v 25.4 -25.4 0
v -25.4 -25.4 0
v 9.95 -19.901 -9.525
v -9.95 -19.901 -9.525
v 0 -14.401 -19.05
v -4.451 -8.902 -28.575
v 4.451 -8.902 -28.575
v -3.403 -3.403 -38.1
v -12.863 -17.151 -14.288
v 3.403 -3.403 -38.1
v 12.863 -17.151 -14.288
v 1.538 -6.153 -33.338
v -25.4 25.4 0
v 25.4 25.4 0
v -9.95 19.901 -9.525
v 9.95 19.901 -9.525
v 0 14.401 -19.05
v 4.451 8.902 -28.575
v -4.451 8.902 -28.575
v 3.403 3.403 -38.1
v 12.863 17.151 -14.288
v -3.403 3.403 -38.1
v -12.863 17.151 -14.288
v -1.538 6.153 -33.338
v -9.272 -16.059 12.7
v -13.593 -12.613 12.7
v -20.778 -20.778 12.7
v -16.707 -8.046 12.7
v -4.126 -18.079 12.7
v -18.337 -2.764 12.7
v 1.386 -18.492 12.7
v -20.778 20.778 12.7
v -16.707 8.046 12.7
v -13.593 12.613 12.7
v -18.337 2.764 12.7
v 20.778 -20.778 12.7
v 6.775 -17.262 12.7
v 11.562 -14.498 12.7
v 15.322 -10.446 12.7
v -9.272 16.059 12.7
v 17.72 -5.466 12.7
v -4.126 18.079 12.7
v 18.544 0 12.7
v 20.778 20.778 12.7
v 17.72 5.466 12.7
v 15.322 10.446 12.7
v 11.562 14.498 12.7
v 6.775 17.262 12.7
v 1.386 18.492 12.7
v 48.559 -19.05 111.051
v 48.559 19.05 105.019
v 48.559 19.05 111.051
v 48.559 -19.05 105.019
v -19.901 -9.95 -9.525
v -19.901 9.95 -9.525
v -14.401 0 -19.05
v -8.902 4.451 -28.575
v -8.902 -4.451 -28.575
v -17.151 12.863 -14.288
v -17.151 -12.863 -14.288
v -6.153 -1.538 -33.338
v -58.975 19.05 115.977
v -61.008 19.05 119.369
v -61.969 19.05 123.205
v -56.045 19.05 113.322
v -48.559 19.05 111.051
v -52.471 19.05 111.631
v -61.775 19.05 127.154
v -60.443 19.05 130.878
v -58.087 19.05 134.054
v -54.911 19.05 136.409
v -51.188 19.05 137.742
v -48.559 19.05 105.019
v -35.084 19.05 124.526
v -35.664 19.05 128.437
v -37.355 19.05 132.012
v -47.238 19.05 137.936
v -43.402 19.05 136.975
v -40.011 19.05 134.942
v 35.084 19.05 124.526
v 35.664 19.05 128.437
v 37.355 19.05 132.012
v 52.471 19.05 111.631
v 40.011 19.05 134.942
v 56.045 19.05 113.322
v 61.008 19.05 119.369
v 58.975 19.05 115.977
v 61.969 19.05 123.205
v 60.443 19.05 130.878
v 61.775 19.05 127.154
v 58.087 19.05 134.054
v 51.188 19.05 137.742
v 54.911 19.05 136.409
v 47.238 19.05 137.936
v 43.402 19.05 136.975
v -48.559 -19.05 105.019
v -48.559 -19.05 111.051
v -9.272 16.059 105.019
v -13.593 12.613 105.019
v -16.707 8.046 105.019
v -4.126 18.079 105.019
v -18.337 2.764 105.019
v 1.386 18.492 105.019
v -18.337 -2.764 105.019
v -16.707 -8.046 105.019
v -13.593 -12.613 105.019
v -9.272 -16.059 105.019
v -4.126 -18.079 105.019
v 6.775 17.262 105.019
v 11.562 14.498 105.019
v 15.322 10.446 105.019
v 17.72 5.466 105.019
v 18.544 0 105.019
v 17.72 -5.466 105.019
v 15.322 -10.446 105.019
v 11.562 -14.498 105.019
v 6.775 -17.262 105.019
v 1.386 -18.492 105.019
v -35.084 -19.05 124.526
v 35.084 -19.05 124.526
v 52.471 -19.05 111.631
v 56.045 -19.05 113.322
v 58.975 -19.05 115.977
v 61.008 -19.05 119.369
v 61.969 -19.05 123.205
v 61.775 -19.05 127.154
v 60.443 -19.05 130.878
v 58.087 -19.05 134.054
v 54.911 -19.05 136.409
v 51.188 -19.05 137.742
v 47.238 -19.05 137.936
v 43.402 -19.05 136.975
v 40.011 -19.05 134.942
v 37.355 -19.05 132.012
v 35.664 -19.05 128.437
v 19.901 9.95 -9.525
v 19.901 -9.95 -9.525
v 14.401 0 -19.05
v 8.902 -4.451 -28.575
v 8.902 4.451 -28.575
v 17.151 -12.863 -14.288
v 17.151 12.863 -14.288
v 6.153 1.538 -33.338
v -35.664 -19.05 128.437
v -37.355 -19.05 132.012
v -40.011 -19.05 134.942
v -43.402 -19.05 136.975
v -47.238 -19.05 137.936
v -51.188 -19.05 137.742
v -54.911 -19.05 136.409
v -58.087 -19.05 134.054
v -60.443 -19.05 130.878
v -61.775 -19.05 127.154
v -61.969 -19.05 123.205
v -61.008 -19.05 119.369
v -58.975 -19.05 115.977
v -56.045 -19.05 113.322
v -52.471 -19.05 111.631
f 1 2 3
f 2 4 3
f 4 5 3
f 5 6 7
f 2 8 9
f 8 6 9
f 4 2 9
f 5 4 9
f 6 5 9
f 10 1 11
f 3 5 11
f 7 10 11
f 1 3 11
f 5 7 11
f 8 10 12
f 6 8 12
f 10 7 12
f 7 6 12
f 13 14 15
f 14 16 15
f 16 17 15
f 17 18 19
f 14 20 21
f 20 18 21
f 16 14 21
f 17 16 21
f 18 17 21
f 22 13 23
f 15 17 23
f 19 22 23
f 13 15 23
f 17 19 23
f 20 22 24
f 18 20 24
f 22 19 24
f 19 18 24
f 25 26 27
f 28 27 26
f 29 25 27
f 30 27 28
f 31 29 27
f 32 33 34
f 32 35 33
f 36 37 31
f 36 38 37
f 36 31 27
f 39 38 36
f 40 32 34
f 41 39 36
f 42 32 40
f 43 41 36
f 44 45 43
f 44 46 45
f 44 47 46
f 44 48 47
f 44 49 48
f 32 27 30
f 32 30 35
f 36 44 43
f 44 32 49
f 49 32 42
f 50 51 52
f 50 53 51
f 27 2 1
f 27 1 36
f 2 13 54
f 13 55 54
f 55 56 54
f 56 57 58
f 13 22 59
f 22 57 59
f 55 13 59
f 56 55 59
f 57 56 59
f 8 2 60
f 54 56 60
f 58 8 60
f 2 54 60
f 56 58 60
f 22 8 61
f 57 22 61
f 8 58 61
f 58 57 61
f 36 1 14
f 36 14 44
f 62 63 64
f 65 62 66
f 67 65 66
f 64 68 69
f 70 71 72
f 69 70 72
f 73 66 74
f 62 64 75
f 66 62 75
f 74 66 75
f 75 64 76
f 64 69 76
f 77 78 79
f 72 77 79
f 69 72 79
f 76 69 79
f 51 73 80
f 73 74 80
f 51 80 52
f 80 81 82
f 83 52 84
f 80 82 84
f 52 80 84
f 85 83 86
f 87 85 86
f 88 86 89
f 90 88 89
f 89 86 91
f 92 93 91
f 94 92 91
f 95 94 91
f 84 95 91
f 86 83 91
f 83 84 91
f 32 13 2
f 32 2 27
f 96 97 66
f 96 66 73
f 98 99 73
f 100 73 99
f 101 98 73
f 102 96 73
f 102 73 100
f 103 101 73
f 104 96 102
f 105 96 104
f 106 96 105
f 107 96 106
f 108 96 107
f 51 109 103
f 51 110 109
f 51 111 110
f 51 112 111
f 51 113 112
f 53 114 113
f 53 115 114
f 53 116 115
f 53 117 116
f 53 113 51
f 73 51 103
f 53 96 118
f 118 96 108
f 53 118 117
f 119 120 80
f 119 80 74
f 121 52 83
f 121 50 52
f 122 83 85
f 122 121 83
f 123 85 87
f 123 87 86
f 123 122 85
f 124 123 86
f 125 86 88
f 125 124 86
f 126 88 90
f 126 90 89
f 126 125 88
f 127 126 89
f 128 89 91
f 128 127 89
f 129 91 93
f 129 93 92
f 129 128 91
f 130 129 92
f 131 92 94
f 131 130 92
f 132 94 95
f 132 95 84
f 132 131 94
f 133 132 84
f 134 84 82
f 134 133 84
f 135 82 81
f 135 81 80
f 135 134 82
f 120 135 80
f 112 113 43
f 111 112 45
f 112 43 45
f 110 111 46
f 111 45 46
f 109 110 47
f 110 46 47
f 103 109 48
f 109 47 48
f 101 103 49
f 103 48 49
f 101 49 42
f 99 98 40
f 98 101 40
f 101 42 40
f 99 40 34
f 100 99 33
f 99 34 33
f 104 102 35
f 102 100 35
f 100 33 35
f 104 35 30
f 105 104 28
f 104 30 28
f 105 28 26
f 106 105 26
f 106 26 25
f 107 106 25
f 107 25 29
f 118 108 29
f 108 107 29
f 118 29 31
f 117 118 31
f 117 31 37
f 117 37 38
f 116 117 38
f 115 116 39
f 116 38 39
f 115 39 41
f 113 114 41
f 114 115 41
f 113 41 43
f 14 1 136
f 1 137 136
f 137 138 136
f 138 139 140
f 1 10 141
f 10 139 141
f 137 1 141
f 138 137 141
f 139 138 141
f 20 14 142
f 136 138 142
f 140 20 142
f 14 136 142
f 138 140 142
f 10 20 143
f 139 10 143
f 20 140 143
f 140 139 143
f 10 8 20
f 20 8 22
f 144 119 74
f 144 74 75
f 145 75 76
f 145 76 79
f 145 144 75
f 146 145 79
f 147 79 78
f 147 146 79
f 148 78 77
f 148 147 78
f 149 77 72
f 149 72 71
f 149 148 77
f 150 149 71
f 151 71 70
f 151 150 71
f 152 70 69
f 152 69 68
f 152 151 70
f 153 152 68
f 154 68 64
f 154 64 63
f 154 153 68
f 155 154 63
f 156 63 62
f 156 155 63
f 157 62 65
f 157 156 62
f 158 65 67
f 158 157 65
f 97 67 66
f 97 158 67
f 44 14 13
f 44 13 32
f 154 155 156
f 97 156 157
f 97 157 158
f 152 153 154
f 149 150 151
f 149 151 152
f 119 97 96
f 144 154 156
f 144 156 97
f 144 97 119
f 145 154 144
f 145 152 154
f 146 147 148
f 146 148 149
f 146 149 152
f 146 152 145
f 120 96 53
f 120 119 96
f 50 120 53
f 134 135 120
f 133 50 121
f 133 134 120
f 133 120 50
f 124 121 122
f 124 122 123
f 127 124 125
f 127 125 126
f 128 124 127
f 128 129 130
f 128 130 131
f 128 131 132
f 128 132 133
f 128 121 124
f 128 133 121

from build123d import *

# Parameters (mm, degrees)
F0_W      = 50.8
F0_H      = 50.8
F1_DEPTH  = 38.1
F1_TAPER  = 30
F1_FACE_W = 50.8
F1_FACE_H = 50.8
F2_DEPTH  = 12.7
F2_TAPER  = 20
F3_R      = 18.5436929907
F4_DEPTH  = 101.6
F6_DEPTH  = 19.05


with BuildPart() as f1:
    # F0 (on Top) → F1 (new body)
    with BuildSketch(Plane.XY):
        Rectangle(F0_W, F0_H)
    extrude(amount=-F1_DEPTH, taper=F1_TAPER)

    # F1_face (on face) → F2 (join)
    with BuildSketch(Plane.XY):
        Rectangle(F1_FACE_W, F1_FACE_H)
    extrude(amount=F2_DEPTH, taper=F2_TAPER)

    # F3 (on face) → F4 (join)
    with BuildSketch(Plane.XY.offset(12.7)):
        Circle(F3_R)
    extrude(amount=F4_DEPTH)

    # F5 (on Front) → F6 (join, symmetric)
    with BuildSketch(Plane.XZ):
        with BuildLine():
            ThreePointArc((48.5590323806, 111.0507363485), (58.0872045338, 134.0537787855), (35.0841620969, 124.5256066322))
            Line((35.0841620969, 124.5256066322), (-35.0841620969, 124.5256066322))
            ThreePointArc((-35.0841620969, 124.5256066322), (-58.0872045338, 134.0537787855), (-48.5590323806, 111.0507363485))
            Line((-48.5590323806, 111.0507363485), (-48.5590323806, 105.0193756819))
            Line((-48.5590323806, 105.0193756819), (48.5590323806, 105.0193756819))
            Line((48.5590323806, 105.0193756819), (48.5590323806, 111.0507363485))
        make_face()
    extrude(amount=F6_DEPTH, both=True)


solid = f1.part
